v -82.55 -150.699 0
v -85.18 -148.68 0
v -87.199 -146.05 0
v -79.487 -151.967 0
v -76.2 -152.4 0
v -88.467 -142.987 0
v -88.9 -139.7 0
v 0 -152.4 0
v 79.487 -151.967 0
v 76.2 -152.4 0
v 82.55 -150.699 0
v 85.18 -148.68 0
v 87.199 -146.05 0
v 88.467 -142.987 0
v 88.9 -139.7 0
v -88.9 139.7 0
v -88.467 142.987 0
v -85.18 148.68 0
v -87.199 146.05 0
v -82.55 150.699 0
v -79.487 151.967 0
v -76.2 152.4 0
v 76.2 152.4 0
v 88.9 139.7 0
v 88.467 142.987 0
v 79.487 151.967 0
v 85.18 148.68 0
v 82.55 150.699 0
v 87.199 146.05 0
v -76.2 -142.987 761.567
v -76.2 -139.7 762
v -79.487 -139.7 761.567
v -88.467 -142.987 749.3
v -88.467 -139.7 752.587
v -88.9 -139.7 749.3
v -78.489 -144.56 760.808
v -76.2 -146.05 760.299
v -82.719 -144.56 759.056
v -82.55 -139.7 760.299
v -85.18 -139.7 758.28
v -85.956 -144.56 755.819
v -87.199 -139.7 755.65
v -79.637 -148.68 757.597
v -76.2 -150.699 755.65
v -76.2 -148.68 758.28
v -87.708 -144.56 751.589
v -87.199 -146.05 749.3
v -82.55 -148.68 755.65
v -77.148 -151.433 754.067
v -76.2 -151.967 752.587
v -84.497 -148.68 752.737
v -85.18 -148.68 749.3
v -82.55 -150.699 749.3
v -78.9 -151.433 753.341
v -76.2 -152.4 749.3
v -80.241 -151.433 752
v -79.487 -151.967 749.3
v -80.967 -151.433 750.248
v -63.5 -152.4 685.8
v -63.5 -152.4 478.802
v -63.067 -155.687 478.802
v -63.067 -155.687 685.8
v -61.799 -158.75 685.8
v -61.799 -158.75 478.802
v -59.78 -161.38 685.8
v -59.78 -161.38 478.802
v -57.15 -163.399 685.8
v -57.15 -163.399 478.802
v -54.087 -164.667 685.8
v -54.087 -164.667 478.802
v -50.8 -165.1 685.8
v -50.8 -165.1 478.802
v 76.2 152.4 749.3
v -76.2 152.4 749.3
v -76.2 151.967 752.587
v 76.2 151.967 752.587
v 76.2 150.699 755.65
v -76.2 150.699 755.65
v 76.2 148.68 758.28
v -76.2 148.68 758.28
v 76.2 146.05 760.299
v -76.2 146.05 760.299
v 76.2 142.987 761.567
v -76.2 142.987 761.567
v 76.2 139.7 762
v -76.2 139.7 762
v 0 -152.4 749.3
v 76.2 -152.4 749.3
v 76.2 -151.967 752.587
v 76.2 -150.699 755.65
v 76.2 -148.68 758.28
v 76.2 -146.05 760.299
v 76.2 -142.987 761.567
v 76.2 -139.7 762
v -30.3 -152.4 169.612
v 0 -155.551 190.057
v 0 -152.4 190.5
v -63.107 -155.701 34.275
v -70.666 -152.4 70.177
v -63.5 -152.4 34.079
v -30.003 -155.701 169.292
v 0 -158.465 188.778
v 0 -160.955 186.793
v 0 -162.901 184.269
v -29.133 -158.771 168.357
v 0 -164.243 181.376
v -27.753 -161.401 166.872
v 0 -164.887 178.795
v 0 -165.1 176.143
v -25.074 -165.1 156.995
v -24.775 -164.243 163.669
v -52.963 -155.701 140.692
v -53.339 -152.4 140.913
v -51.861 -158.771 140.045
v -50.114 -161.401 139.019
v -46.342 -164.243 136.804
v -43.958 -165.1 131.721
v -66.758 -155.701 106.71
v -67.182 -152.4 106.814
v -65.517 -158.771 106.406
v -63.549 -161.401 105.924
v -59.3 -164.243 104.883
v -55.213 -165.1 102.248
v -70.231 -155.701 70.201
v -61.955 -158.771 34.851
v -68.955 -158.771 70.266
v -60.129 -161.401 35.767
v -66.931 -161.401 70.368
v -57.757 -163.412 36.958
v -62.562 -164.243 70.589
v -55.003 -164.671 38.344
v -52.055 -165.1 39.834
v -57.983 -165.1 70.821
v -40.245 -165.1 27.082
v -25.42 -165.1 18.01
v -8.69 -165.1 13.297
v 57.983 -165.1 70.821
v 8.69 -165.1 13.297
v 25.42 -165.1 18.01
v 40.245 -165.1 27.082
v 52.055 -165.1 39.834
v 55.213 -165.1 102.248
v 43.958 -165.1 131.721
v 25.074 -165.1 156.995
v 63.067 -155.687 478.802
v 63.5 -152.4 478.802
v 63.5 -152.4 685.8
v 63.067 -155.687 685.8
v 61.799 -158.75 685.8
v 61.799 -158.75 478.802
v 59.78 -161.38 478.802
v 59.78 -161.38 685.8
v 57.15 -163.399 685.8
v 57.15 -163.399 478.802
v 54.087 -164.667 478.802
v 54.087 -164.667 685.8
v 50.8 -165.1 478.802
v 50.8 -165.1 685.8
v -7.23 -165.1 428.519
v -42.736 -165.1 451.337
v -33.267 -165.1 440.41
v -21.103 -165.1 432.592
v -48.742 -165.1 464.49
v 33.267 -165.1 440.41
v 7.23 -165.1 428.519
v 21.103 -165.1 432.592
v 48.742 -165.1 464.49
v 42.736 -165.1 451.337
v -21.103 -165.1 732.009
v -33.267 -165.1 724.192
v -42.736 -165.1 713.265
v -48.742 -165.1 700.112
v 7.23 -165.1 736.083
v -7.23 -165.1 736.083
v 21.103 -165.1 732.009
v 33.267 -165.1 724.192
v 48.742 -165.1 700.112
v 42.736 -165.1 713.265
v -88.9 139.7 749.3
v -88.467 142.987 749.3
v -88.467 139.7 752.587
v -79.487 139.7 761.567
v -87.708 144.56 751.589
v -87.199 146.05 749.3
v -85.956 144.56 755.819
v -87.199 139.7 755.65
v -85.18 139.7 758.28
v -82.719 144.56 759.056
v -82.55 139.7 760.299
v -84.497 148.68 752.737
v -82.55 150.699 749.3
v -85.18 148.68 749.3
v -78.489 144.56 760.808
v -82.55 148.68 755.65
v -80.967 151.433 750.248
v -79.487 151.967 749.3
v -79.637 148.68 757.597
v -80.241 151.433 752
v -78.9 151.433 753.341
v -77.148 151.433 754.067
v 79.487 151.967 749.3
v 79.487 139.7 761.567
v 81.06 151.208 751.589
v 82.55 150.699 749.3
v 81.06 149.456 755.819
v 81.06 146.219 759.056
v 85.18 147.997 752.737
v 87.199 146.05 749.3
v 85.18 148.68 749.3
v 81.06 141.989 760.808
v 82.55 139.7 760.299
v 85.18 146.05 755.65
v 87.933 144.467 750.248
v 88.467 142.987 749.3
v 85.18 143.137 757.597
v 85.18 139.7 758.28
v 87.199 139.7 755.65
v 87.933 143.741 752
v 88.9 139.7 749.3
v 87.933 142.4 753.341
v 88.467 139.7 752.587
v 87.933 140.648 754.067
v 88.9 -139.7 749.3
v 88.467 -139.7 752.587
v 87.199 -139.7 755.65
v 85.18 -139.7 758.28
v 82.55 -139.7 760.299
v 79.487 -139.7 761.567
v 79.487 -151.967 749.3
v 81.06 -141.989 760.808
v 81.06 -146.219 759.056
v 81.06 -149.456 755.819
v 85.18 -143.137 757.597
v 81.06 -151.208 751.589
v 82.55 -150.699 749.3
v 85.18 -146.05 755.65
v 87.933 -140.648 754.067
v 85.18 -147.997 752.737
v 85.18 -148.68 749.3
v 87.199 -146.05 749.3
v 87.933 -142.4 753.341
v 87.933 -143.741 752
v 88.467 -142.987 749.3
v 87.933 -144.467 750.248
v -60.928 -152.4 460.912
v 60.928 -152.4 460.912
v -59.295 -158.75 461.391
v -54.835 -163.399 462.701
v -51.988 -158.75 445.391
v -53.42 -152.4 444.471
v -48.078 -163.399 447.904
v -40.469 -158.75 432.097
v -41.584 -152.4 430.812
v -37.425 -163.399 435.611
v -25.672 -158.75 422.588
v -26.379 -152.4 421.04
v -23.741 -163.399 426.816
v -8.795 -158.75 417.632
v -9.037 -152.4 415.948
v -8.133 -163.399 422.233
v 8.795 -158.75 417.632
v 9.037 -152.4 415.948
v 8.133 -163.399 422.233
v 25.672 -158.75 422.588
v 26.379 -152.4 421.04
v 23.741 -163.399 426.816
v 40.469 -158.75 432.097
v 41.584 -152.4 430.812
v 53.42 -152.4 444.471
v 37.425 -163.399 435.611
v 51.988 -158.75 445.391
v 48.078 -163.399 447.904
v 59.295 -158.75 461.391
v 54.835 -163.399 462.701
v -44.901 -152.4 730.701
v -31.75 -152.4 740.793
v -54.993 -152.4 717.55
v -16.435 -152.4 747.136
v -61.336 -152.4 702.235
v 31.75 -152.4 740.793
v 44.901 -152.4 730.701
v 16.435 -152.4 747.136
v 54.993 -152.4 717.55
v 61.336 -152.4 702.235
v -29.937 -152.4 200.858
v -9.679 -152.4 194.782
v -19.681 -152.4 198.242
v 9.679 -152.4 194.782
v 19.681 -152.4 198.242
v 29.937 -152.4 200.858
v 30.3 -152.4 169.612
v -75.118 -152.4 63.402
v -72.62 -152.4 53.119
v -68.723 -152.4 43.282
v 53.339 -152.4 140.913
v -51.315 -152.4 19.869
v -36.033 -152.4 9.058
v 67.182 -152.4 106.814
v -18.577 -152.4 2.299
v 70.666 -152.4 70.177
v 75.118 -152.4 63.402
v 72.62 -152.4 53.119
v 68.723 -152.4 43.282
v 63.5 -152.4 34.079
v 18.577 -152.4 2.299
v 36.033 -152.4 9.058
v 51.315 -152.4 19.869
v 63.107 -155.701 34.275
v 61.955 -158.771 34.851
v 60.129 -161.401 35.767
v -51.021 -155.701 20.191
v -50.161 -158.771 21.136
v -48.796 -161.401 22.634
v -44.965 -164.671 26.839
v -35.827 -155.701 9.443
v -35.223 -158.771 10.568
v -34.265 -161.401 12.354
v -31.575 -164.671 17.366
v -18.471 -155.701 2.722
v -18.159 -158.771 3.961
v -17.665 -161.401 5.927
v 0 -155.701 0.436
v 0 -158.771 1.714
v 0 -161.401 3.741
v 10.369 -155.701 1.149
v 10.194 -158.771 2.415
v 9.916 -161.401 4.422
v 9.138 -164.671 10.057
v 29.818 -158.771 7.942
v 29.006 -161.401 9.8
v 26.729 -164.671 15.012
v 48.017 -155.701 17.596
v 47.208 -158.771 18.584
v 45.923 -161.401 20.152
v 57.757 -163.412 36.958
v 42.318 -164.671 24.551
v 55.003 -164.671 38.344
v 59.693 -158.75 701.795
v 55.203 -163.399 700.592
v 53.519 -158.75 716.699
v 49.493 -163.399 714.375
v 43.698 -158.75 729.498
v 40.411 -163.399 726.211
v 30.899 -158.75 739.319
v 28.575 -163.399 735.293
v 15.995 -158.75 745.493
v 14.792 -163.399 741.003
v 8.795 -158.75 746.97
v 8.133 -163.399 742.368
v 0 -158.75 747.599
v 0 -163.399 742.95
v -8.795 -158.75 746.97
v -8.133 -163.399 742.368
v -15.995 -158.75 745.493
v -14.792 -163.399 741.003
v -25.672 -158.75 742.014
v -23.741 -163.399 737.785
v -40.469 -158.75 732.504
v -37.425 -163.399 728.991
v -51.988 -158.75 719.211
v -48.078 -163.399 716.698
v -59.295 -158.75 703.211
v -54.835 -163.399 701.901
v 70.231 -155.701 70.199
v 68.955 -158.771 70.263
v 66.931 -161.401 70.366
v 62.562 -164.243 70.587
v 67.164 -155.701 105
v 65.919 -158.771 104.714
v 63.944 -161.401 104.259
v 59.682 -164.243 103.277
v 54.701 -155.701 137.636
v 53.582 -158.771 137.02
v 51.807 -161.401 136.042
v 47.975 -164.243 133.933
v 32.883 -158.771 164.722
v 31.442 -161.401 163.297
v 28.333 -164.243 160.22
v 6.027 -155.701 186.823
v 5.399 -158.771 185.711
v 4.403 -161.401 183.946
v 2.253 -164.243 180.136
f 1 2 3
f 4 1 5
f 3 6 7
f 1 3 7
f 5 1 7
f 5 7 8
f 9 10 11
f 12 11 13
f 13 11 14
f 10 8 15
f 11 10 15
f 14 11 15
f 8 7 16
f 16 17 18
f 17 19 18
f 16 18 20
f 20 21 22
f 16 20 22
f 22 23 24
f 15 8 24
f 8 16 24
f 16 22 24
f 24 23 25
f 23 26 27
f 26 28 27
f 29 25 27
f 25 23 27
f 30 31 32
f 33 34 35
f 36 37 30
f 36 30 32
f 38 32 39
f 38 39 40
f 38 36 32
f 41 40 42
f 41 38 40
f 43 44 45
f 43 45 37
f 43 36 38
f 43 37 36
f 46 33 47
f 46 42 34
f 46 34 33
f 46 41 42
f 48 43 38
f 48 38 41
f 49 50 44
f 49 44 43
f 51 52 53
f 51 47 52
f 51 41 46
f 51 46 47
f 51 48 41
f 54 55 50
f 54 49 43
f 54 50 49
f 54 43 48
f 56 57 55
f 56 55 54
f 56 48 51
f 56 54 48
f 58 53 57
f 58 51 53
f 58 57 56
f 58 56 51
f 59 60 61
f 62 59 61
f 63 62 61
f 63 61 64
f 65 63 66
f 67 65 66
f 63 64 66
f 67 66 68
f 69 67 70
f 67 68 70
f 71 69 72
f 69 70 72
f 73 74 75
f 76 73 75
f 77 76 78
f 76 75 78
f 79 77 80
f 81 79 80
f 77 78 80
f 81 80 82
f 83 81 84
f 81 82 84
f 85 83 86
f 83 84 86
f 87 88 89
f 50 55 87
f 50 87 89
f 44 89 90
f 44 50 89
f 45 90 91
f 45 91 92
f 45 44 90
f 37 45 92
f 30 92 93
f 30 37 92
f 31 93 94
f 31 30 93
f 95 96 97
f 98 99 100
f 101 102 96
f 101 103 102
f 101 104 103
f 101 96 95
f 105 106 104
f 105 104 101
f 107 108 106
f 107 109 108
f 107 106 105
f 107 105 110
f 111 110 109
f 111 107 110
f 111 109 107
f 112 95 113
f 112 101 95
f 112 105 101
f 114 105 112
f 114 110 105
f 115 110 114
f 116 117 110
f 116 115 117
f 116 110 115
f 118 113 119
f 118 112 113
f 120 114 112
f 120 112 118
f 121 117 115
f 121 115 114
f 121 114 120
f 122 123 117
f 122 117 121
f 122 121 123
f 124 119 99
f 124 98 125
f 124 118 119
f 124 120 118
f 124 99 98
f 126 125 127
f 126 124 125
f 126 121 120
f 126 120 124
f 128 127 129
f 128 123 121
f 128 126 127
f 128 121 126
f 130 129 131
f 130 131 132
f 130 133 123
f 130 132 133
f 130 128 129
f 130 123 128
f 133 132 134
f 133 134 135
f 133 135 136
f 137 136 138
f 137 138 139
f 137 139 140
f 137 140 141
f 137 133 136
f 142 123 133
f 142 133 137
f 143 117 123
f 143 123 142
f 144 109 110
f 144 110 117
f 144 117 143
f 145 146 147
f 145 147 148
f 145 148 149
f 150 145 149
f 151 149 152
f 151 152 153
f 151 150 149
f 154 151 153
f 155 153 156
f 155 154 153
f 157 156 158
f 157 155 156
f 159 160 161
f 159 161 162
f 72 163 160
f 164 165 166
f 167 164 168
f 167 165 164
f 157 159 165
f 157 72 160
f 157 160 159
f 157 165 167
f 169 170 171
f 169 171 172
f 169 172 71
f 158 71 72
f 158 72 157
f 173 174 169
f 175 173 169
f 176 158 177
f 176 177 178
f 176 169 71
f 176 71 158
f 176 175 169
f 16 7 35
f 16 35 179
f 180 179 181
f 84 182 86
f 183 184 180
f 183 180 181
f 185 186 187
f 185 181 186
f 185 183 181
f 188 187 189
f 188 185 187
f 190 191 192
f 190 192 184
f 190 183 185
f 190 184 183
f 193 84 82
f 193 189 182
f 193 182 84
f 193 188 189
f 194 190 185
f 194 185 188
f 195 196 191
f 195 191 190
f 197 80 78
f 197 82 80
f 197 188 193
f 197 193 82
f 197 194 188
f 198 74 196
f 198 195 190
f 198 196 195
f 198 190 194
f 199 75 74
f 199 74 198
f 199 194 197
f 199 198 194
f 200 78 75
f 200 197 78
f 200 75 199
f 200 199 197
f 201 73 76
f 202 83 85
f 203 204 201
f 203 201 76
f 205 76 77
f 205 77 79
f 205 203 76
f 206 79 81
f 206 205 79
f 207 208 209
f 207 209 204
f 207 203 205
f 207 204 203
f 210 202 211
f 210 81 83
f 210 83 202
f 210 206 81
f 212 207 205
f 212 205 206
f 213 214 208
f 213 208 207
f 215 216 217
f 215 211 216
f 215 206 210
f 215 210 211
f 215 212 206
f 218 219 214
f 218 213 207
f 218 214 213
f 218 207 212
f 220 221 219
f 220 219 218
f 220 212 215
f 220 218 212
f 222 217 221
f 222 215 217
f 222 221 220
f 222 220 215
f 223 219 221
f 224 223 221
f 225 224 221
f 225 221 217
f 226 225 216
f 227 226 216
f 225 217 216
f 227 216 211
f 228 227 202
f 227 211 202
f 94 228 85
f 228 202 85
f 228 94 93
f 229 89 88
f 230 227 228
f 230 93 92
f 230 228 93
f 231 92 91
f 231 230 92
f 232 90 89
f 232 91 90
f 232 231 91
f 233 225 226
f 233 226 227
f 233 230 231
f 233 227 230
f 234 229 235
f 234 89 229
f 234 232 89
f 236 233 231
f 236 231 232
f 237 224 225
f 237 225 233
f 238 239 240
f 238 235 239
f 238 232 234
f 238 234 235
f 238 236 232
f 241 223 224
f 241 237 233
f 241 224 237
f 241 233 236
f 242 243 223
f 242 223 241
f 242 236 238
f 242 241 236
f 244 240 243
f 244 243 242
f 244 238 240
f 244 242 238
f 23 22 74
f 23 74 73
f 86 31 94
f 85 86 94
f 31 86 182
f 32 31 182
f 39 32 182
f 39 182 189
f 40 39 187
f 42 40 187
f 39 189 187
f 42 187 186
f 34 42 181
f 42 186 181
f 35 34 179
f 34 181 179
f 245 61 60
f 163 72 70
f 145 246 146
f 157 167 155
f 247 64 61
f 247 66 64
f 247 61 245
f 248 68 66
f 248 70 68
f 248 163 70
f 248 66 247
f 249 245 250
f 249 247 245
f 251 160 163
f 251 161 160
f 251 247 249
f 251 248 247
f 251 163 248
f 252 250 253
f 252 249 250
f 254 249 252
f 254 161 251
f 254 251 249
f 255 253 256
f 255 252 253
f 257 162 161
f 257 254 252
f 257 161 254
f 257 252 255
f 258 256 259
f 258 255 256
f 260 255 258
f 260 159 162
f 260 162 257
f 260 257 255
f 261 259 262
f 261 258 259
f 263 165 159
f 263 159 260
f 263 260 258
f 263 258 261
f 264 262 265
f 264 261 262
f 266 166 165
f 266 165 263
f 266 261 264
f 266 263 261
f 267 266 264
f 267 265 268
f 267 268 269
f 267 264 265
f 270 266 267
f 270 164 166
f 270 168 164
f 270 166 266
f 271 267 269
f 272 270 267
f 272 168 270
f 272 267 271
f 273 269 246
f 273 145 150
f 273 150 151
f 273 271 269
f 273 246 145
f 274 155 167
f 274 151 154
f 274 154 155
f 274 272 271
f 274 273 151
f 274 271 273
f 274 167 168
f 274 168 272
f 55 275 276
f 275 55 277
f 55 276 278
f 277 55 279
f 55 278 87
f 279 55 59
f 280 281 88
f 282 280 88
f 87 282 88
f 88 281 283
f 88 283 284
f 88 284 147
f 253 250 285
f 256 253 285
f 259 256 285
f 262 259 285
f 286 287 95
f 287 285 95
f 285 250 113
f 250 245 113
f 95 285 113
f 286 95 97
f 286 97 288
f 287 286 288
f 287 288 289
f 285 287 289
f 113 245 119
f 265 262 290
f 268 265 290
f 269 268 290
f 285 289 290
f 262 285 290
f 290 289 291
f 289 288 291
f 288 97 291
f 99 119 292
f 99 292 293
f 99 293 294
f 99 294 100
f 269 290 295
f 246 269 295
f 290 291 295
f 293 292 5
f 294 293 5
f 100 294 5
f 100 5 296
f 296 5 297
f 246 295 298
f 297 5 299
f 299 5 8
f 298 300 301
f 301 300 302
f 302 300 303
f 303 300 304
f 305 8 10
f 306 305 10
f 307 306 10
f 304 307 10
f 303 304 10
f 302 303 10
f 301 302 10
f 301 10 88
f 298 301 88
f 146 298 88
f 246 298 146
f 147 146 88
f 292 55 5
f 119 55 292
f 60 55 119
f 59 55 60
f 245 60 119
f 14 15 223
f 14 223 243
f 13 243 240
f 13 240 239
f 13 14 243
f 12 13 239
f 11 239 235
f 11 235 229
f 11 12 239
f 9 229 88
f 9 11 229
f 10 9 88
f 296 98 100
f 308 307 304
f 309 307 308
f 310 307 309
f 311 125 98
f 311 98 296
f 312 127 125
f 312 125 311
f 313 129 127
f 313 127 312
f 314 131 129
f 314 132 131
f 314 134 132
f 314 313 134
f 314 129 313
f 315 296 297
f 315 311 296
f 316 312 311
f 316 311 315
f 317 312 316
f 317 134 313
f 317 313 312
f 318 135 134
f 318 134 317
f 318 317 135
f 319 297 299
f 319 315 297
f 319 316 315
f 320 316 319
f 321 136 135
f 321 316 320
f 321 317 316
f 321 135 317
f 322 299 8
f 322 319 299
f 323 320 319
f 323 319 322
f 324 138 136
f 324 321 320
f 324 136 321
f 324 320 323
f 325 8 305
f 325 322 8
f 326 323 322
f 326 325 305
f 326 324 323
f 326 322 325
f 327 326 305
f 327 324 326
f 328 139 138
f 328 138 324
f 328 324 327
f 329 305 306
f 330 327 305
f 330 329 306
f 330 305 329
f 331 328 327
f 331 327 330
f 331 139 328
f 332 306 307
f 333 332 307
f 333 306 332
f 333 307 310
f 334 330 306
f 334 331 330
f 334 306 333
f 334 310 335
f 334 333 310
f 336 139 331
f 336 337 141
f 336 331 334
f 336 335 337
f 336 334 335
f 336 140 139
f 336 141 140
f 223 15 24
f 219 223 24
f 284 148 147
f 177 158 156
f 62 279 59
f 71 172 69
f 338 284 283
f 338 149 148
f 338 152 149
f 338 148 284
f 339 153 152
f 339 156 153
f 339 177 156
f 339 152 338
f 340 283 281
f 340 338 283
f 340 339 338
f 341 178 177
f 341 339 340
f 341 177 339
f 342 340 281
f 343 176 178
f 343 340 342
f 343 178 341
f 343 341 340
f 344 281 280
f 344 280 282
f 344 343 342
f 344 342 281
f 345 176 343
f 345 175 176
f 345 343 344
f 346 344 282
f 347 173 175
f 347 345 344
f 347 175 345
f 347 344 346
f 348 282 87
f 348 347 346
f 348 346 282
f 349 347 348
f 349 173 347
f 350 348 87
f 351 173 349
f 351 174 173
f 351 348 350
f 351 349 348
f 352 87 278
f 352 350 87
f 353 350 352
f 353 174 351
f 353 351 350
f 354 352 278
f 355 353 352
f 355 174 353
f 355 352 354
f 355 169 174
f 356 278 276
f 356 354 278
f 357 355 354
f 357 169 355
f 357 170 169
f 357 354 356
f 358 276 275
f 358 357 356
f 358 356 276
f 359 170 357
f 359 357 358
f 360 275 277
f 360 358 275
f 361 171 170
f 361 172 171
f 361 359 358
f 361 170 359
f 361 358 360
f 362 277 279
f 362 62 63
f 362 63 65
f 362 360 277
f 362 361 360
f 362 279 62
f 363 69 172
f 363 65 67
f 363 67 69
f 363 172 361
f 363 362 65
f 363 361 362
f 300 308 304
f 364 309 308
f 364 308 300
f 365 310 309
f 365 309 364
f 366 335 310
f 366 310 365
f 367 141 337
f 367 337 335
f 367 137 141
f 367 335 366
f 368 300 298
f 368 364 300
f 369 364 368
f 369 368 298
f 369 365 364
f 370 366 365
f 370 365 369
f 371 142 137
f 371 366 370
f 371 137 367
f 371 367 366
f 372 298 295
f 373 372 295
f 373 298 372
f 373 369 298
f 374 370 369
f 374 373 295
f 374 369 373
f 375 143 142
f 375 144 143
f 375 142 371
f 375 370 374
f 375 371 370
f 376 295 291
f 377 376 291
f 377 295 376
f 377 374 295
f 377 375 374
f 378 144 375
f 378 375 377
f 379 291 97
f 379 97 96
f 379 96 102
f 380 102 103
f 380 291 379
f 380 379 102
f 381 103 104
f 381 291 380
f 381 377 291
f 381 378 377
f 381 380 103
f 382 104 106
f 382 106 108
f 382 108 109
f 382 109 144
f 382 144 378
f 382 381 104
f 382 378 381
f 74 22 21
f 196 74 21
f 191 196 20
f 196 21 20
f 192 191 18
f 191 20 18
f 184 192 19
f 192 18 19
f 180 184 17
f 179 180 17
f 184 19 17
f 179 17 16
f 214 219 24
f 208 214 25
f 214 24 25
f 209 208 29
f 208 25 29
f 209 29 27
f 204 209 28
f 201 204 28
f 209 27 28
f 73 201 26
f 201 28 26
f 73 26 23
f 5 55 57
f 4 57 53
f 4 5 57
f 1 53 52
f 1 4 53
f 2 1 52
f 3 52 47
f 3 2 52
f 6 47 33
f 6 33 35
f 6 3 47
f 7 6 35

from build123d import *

# Parameters (mm, degrees)
F0_W         = 177.8
F0_H         = 304.8
F1_DEPTH     = 762
F3_DEPTH     = 12.7
F5_T1_DEPTH  = 279.4
F5_T3_DEPTH  = 152.4
F5_T5_DEPTH  = 781.05
F5_T7_DEPTH  = 206.9983323097
F5_S11_W     = 12.954
F5_S11_H     = 12.954
F5_T12_DEPTH = 12.954
F5_S17_W     = 12.954
F5_S17_H     = 12.954
F5_T18_DEPTH = 12.954
F5_S23_W     = 12.954
F5_S23_H     = 12.954
F5_T24_DEPTH = 12.954
F5_S29_W     = 12.954
F5_S29_H     = 12.954
F5_T30_DEPTH = 12.954
F5_T34_ANGLE = 180
F5_T36_ANGLE = 180
F5_T38_ANGLE = 160.6620429302
F5_T40_ANGLE = 121.9975948725
F5_T42_ANGLE = 121.9975948725


# Not quite as in the source:
# - a fillet or chamfer that OpenCascade refuses, or shapes differently, is made with other operations: its cross-section is extruded or revolved along the edge and cut away or added
# - a feature of the source that left no trace in its solid (it failed there, or was rolled back) is left out


with BuildPart() as f1:
    # F0 (on Top) → F1 (new body)
    with BuildSketch(Plane.XY):
        Rectangle(F0_W, F0_H)
    extrude(amount=F1_DEPTH)

    # F2 (on face) → F3 (join)
    with BuildSketch(Plane.XZ.offset(152.4)):
        with BuildLine():
            ThreePointArc((0, 190.5), (-61.5022268, 124.3675088832), (-63.5, 34.0788651625))
            ThreePointArc((-63.5, 34.0788651625), (-36.0333838653, 9.0580961901), (3.12e-07, 0))
            ThreePointArc((3.12e-07, 0), (36.0333841402, 9.0580963377), (63.5, 34.0788651625))
            ThreePointArc((63.5, 34.0788651625), (61.5022268, 124.3675088832), (0, 190.5))
        make_face()
        with BuildLine():
            ThreePointArc((63.5, 685.8), (0, 749.3), (-63.5, 685.8))
            Line((-63.5, 685.8), (-63.5, 478.8016676903))
            ThreePointArc((-63.5, 478.8016676903), (0, 415.3016676903), (63.5, 478.8016676903))
            Line((63.5, 478.8016676903), (63.5, 685.8))
        make_face()
    extrude(amount=F3_DEPTH)

    # F5: fillet of radius 12.7 on 15 edges, made by hand

    # F5_s2 → F5_t1 (cut)
    with BuildSketch(Plane.XZ.offset(-139.7)):
        with BuildLine():
            ThreePointArc((88.9, 749.3), (85.1802561211, 758.2802561211), (76.2, 762))
            Line((76.2, 762), (88.9, 762))
            Line((88.9, 762), (88.9, 749.3))
        make_face()
        with BuildLine():
            ThreePointArc((-76.2, 762), (-85.1802561211, 758.2802561211), (-88.9, 749.3))
            Line((-88.9, 749.3), (-88.9, 762))
            Line((-88.9, 762), (-76.2, 762))
        make_face()
    extrude(amount=F5_T1_DEPTH, mode=Mode.SUBTRACT)

    # F5_s4 → F5_t3 (cut)
    with BuildSketch(Plane.YZ.offset(-76.2)):
        with BuildLine():
            ThreePointArc((152.4, 749.3), (148.6802561211, 758.2802561211), (139.7, 762))
            Line((139.7, 762), (152.4, 762))
            Line((152.4, 762), (152.4, 749.3))
        make_face()
        with BuildLine():
            ThreePointArc((-152.4, 749.3), (-148.6802561211, 758.2802561211), (-139.7, 762))
            Line((-139.7, 762), (-152.4, 762))
            Line((-152.4, 762), (-152.4, 749.3))
        make_face()
    extrude(amount=F5_T3_DEPTH, mode=Mode.SUBTRACT)

    # F5_s6 → F5_t5 (cut)
    with BuildSketch(Plane.XY.offset(-31.75)):
        with BuildLine():
            ThreePointArc((-76.2, -152.4), (-85.1802561211, -148.6802561211), (-88.9, -139.7))
            Line((-88.9, -139.7), (-88.9, -152.4))
            Line((-88.9, -152.4), (-76.2, -152.4))
        make_face()
        with BuildLine():
            ThreePointArc((-76.2, 152.4), (-85.1802561211, 148.6802561211), (-88.9, 139.7))
            Line((-88.9, 139.7), (-88.9, 152.4))
            Line((-88.9, 152.4), (-76.2, 152.4))
        make_face()
        with BuildLine():
            ThreePointArc((88.9, -139.7), (85.1802561211, -148.6802561211), (76.2, -152.4))
            Line((76.2, -152.4), (88.9, -152.4))
            Line((88.9, -152.4), (88.9, -139.7))
        make_face()
        with BuildLine():
            ThreePointArc((88.9, 139.7), (85.1802561211, 148.6802561211), (76.2, 152.4))
            Line((76.2, 152.4), (88.9, 152.4))
            Line((88.9, 152.4), (88.9, 139.7))
        make_face()
    extrude(amount=F5_T5_DEPTH, mode=Mode.SUBTRACT)

    # F5_s8 → F5_t7 (cut)
    with BuildSketch(Plane.XY.offset(478.8016676903)):
        with BuildLine():
            ThreePointArc((63.5, -152.4), (59.7802561211, -161.3802561211), (50.8, -165.1))
            Line((50.8, -165.1), (63.5, -165.1))
            Line((63.5, -165.1), (63.5, -152.4))
        make_face()
        with BuildLine():
            ThreePointArc((-63.5, -152.4), (-59.7802561211, -161.3802561211), (-50.8, -165.1))
            Line((-50.8, -165.1), (-63.5, -165.1))
            Line((-63.5, -165.1), (-63.5, -152.4))
        make_face()
    extrude(amount=F5_T7_DEPTH, mode=Mode.SUBTRACT)


with BuildPart() as f5_tool10:
    # F5_s11 → F5_t12 (new body)
    with BuildSketch(Plane.YZ.offset(76.2)):
        with Locations((-146.177, 755.777)):
            Rectangle(F5_S11_W, F5_S11_H)
    extrude(amount=F5_T12_DEPTH)

    # F5_s13 → F5_t14 (revolve, cut)
    with BuildSketch(Plane(origin=(76.2, -139.7, 749.3), x_dir=(0, 0.7071067812, -0.7071067812), z_dir=(0, -0.7071067812, -0.7071067812))):
        with BuildLine():
            ThreePointArc((0, -12.7), (12.7, 0), (0, 12.7))
            Line((0, 12.7), (0, -12.7))
        make_face()
    revolve(axis=Axis((76.2, -139.7, 749.3), (1, 0, 0)), mode=Mode.SUBTRACT)


with BuildPart() as f1_1:
    add(f1.part)

    # F5_t9: cut F5_tool10
    add(f5_tool10.part, mode=Mode.SUBTRACT)


with BuildPart() as f5_tool16:
    # F5_s17 → F5_t18 (new body)
    with BuildSketch(Plane.YZ.offset(76.2)):
        with Locations((146.177, 755.777)):
            Rectangle(F5_S17_W, F5_S17_H)
    extrude(amount=F5_T18_DEPTH)

    # F5_s19 → F5_t20 (revolve, cut)
    with BuildSketch(Plane(origin=(76.2, 139.7, 749.3), x_dir=(0, -0.7071067812, -0.7071067812), z_dir=(0, -0.7071067812, 0.7071067812))):
        with BuildLine():
            ThreePointArc((0, -12.7), (12.7, 0), (0, 12.7))
            Line((0, 12.7), (0, -12.7))
        make_face()
    revolve(axis=Axis((76.2, 139.7, 749.3), (1, 0, 0)), mode=Mode.SUBTRACT)


with BuildPart() as f1_2:
    add(f1_1.part)

    # F5_t15: cut F5_tool16
    add(f5_tool16.part, mode=Mode.SUBTRACT)


with BuildPart() as f5_tool22:
    # F5_s23 → F5_t24 (new body)
    with BuildSketch(Plane.XZ.offset(-139.7)):
        with Locations((-82.677, 755.777)):
            Rectangle(F5_S23_W, F5_S23_H)
    extrude(amount=-F5_T24_DEPTH)

    # F5_s25 → F5_t26 (revolve, cut)
    with BuildSketch(Plane(origin=(-76.2, 139.7, 749.3), x_dir=(0.7071067812, 0, -0.7071067812), z_dir=(0.7071067812, 0, 0.7071067812))):
        with BuildLine():
            ThreePointArc((0, -12.7), (12.7, 0), (0, 12.7))
            Line((0, 12.7), (0, -12.7))
        make_face()
    revolve(axis=Axis((-76.2, 139.7, 749.3), (0, 1, 0)), mode=Mode.SUBTRACT)


with BuildPart() as f1_3:
    add(f1_2.part)

    # F5_t21: cut F5_tool22
    add(f5_tool22.part, mode=Mode.SUBTRACT)


with BuildPart() as f5_tool28:
    # F5_s29 → F5_t30 (new body)
    with BuildSketch(Plane.XZ.offset(139.7)):
        with Locations((-82.677, 755.777)):
            Rectangle(F5_S29_W, F5_S29_H)
    extrude(amount=F5_T30_DEPTH)

    # F5_s31 → F5_t32 (revolve, cut)
    with BuildSketch(Plane(origin=(-76.2, -139.7, 749.3), x_dir=(0.7071067812, 0, -0.7071067812), z_dir=(-0.7071067812, 0, -0.7071067812))):
        with BuildLine():
            ThreePointArc((0, -12.7), (12.7, 0), (0, 12.7))
            Line((0, 12.7), (0, -12.7))
        make_face()
    revolve(axis=Axis((-76.2, -139.7, 749.3), (0, -1, 0)), mode=Mode.SUBTRACT)


with BuildPart() as f1_4:
    add(f1_3.part)

    # F5_t27: cut F5_tool28
    add(f5_tool28.part, mode=Mode.SUBTRACT)

    # F5_s33 → F5_t34 (revolve, cut)
    with BuildSketch(Plane.XY.offset(478.8016676903)):
        with BuildLine():
            ThreePointArc((-63.5, -152.4), (-59.7802561211, -161.3802561211), (-50.8, -165.1))
            Line((-50.8, -165.1), (-63.5, -165.1))
            Line((-63.5, -165.1), (-63.5, -152.4))
        make_face()
    revolve(axis=Axis((0, -165.1, 478.8016676903), (0, -1, 0)), revolution_arc=F5_T34_ANGLE, mode=Mode.SUBTRACT)

    # F5_s35 → F5_t36 (revolve, cut)
    with BuildSketch(Plane.XY.offset(685.8)):
        with BuildLine():
            ThreePointArc((63.5, -152.4), (59.7802561211, -161.3802561211), (50.8, -165.1))
            Line((50.8, -165.1), (63.5, -165.1))
            Line((63.5, -165.1), (63.5, -152.4))
        make_face()
    revolve(axis=Axis((0, -165.1, 685.8), (0, -1, 0)), revolution_arc=F5_T36_ANGLE, mode=Mode.SUBTRACT)

    # F5_s37 → F5_t38 (revolve, cut)
    with BuildSketch(Plane(origin=(-12.6164174444, 0, 74.050466073), x_dir=(0, 1, 0), z_dir=(-0.1679556687, 0, 0.9857945493))):
        with BuildLine():
            ThreePointArc((-152.4, 63.401778044), (-161.3802561211, 59.6820341651), (-165.1, 50.701778044))
            Line((-165.1, 50.701778044), (-165.1, 63.401778044))
            Line((-165.1, 63.401778044), (-152.4, 63.401778044))
        make_face()
    revolve(axis=Axis((0, -165.1, 76.2), (0, -1, 0)), revolution_arc=F5_T38_ANGLE, mode=Mode.SUBTRACT)

    # F5_s39 → F5_t40 (revolve, cut)
    with BuildSketch(Plane(origin=(69.2556243915, 0, 14.6214058217), x_dir=(0, 1, 0), z_dir=(0.9784320741, 0, 0.2065688173))):
        with BuildLine():
            ThreePointArc((-152.4, 190.3421366621), (-161.3802561211, 186.6223927832), (-165.1, 177.6421366621))
            Line((-165.1, 177.6421366621), (-165.1, 190.3421366621))
            Line((-165.1, 190.3421366621), (-152.4, 190.3421366621))
        make_face()
    revolve(axis=Axis((56.1711141332, -165.1, 76.5973839763), (0, -1, 0)), revolution_arc=F5_T40_ANGLE, mode=Mode.SUBTRACT)

    # F5_s41 → F5_t42 (revolve, cut)
    with BuildSketch(Plane(origin=(11.2454514703, 0, 11.6780216132), x_dir=(0, 1, 0), z_dir=(-0.6936400605, 0, -0.7203217798))):
        with BuildLine():
            ThreePointArc((-152.4, 33.4077090386), (-161.3802561211, 29.6879651596), (-165.1, 20.7077090386))
            Line((-165.1, 20.7077090386), (-165.1, 33.4077090386))
            Line((-165.1, 33.4077090386), (-152.4, 33.4077090386))
        make_face()
    revolve(axis=Axis((-56.1711141332, -165.1, 76.5973839763), (0, -1, 0)), revolution_arc=F5_T42_ANGLE, mode=Mode.SUBTRACT)


solid = f1_4.part
